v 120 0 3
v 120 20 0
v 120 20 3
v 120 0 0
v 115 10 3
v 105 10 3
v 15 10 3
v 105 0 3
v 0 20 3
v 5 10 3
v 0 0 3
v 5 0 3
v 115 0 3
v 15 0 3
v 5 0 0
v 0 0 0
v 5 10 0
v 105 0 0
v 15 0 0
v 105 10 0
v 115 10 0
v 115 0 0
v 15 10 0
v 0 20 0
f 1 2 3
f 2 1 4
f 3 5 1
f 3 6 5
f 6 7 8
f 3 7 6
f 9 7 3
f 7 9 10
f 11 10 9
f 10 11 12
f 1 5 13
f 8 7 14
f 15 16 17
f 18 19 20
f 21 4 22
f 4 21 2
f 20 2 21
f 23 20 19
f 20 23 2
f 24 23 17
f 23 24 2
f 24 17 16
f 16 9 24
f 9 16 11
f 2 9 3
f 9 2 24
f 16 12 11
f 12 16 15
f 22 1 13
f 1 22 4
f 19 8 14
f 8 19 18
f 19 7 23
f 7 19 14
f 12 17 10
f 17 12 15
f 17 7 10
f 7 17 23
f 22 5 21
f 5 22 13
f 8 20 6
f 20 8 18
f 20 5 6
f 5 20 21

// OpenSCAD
difference(){
cube ([120,20,3]);
translate ([5,-5,-5])cube ([10,15,10]);
translate ([105,-5,-5])cube ([10,15,10]);
}
